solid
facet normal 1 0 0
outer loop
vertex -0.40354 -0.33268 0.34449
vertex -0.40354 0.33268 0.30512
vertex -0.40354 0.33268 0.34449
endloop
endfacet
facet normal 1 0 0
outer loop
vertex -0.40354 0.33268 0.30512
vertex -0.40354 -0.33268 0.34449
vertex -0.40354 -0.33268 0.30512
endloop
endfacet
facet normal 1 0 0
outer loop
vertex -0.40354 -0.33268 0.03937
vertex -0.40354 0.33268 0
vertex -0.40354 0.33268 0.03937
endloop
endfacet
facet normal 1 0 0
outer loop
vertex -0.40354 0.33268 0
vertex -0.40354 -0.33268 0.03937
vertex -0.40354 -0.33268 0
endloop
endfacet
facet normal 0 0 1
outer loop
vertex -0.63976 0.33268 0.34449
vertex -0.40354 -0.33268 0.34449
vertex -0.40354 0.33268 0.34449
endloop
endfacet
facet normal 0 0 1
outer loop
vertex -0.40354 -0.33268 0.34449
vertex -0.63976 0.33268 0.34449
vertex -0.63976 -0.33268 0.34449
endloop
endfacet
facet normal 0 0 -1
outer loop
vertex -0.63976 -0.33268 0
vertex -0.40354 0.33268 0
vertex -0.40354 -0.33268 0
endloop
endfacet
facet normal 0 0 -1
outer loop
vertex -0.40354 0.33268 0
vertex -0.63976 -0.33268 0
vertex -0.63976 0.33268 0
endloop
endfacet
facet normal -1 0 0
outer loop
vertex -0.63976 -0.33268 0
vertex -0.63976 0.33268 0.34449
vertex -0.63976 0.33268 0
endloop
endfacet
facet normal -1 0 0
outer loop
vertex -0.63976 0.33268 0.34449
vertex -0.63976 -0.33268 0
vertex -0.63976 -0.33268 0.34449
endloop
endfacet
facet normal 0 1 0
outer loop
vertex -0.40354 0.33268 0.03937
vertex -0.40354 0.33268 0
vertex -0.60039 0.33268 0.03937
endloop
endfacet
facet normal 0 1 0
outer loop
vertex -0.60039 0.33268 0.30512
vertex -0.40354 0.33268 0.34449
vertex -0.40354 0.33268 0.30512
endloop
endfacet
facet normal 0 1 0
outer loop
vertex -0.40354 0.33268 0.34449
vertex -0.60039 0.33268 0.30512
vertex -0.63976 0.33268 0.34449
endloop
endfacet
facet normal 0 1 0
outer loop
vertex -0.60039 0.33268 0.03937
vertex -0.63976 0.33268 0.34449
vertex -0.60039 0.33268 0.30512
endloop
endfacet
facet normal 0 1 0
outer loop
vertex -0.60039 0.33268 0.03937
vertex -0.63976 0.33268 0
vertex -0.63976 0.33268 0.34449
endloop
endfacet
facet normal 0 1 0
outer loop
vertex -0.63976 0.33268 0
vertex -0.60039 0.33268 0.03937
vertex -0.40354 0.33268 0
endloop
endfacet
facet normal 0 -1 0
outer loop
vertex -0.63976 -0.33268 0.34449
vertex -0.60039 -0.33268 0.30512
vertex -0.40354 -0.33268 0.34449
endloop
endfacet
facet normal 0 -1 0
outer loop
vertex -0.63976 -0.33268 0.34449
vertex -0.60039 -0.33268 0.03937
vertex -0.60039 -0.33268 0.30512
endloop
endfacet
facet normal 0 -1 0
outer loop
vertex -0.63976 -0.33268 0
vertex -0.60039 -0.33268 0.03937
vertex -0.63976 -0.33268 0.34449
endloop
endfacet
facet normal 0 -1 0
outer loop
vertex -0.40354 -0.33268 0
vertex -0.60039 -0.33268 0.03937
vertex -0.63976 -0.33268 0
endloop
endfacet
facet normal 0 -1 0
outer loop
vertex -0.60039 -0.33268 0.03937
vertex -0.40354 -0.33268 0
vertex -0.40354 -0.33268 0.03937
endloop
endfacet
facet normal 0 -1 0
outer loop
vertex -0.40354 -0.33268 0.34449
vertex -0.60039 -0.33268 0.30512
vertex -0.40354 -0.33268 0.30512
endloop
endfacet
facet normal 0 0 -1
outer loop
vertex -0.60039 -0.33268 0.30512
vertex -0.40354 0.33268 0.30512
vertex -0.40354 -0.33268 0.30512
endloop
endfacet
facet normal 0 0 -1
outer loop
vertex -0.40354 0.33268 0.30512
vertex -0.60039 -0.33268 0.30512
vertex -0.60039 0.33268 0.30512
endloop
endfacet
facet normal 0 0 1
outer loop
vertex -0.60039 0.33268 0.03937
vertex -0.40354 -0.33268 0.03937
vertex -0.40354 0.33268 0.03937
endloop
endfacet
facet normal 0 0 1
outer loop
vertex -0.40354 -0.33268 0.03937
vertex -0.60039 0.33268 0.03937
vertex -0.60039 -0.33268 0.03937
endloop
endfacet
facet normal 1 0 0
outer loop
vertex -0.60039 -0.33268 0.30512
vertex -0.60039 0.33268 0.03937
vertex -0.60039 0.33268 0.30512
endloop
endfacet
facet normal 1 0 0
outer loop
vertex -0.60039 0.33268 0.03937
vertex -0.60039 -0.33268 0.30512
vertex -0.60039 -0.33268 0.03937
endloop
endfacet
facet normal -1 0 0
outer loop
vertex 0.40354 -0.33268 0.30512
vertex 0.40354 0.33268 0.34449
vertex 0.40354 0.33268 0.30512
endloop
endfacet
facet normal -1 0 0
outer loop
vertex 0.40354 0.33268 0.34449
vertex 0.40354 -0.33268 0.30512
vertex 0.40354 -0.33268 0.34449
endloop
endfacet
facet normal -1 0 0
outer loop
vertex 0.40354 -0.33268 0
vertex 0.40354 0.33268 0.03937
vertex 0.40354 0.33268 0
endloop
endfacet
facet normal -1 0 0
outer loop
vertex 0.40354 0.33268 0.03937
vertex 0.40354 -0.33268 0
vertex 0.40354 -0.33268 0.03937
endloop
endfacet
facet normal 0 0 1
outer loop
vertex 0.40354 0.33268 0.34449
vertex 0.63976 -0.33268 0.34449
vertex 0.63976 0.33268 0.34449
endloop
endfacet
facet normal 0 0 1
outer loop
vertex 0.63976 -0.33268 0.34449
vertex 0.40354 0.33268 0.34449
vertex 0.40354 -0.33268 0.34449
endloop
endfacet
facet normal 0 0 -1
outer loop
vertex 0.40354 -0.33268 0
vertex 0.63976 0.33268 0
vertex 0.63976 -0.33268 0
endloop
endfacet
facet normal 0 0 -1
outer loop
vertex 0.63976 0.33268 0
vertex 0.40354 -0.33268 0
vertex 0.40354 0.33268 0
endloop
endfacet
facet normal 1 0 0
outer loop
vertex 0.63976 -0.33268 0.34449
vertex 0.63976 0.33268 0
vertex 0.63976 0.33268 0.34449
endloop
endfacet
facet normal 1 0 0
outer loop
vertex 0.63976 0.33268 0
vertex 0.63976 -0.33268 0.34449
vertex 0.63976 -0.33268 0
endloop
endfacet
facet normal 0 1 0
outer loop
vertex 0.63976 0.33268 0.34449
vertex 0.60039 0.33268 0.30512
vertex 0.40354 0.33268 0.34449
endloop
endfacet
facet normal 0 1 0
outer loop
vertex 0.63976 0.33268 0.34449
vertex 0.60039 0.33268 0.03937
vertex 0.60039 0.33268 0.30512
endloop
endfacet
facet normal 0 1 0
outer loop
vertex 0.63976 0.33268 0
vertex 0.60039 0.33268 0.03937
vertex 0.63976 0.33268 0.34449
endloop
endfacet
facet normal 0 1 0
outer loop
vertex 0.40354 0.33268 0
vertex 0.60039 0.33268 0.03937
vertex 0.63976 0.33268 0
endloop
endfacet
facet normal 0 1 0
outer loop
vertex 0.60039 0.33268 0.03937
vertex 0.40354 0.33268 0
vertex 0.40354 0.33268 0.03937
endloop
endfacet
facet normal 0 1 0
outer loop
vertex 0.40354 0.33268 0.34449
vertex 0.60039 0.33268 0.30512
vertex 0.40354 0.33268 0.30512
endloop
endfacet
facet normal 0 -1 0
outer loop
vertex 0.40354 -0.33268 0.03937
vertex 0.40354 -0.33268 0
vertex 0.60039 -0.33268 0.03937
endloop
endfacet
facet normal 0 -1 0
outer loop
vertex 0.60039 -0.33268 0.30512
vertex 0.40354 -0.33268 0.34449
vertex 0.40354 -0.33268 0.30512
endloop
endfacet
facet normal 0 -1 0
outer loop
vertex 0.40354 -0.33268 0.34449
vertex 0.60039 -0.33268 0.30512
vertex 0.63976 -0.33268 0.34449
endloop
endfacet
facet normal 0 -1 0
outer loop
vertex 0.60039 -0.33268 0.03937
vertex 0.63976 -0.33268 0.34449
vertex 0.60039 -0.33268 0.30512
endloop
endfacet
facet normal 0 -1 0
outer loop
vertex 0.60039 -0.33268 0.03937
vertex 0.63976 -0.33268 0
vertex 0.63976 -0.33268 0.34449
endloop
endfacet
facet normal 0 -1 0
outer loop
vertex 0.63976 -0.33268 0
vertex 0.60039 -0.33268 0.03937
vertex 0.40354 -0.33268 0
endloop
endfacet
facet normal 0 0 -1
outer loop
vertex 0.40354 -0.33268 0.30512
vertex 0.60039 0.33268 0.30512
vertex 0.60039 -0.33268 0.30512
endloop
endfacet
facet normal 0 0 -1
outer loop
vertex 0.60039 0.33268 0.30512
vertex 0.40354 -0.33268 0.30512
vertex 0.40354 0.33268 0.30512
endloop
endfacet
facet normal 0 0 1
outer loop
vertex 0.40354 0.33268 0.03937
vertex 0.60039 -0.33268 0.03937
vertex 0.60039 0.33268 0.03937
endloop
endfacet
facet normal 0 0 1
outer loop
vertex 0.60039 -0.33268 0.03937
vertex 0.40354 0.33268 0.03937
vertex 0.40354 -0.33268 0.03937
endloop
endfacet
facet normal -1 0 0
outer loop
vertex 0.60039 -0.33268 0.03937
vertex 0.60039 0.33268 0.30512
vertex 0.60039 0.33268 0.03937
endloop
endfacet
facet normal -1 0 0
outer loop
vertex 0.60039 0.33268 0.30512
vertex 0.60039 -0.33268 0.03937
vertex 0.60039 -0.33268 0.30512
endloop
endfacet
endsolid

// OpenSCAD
// file: defines.scad
A = 3.25;   // 3.00...3.50
B = 1.65;   // 1.50...1.80
C = 0.875;  // 0.45...0.75
D = 0.6;    // 0.10...0.75
E = 0.01;
/*E = 0.45;   // 0.25...0.65*/

pt = 0.1; // Толщина элеметов (дорожек, краски и т.п)
lab_mark = 0.3; // Полоска
plw = 0.02; // Толщина лужения

$fn = 32;

scale = 1/2.54;
// main file
include <defines.scad>

module Pin()
{
  difference() {
    translate([-A/2, -B/2-plw, 0]) cube([D, B+2*plw, C]);
    translate([-A/2+pt, -B/2-0.1, pt]) cube([D+0.2, B+0.2, C-pt-pt]);
  }
}

color("White") scale(scale) Pin();
color("White") scale(scale) mirror([1,0,0]) Pin();
